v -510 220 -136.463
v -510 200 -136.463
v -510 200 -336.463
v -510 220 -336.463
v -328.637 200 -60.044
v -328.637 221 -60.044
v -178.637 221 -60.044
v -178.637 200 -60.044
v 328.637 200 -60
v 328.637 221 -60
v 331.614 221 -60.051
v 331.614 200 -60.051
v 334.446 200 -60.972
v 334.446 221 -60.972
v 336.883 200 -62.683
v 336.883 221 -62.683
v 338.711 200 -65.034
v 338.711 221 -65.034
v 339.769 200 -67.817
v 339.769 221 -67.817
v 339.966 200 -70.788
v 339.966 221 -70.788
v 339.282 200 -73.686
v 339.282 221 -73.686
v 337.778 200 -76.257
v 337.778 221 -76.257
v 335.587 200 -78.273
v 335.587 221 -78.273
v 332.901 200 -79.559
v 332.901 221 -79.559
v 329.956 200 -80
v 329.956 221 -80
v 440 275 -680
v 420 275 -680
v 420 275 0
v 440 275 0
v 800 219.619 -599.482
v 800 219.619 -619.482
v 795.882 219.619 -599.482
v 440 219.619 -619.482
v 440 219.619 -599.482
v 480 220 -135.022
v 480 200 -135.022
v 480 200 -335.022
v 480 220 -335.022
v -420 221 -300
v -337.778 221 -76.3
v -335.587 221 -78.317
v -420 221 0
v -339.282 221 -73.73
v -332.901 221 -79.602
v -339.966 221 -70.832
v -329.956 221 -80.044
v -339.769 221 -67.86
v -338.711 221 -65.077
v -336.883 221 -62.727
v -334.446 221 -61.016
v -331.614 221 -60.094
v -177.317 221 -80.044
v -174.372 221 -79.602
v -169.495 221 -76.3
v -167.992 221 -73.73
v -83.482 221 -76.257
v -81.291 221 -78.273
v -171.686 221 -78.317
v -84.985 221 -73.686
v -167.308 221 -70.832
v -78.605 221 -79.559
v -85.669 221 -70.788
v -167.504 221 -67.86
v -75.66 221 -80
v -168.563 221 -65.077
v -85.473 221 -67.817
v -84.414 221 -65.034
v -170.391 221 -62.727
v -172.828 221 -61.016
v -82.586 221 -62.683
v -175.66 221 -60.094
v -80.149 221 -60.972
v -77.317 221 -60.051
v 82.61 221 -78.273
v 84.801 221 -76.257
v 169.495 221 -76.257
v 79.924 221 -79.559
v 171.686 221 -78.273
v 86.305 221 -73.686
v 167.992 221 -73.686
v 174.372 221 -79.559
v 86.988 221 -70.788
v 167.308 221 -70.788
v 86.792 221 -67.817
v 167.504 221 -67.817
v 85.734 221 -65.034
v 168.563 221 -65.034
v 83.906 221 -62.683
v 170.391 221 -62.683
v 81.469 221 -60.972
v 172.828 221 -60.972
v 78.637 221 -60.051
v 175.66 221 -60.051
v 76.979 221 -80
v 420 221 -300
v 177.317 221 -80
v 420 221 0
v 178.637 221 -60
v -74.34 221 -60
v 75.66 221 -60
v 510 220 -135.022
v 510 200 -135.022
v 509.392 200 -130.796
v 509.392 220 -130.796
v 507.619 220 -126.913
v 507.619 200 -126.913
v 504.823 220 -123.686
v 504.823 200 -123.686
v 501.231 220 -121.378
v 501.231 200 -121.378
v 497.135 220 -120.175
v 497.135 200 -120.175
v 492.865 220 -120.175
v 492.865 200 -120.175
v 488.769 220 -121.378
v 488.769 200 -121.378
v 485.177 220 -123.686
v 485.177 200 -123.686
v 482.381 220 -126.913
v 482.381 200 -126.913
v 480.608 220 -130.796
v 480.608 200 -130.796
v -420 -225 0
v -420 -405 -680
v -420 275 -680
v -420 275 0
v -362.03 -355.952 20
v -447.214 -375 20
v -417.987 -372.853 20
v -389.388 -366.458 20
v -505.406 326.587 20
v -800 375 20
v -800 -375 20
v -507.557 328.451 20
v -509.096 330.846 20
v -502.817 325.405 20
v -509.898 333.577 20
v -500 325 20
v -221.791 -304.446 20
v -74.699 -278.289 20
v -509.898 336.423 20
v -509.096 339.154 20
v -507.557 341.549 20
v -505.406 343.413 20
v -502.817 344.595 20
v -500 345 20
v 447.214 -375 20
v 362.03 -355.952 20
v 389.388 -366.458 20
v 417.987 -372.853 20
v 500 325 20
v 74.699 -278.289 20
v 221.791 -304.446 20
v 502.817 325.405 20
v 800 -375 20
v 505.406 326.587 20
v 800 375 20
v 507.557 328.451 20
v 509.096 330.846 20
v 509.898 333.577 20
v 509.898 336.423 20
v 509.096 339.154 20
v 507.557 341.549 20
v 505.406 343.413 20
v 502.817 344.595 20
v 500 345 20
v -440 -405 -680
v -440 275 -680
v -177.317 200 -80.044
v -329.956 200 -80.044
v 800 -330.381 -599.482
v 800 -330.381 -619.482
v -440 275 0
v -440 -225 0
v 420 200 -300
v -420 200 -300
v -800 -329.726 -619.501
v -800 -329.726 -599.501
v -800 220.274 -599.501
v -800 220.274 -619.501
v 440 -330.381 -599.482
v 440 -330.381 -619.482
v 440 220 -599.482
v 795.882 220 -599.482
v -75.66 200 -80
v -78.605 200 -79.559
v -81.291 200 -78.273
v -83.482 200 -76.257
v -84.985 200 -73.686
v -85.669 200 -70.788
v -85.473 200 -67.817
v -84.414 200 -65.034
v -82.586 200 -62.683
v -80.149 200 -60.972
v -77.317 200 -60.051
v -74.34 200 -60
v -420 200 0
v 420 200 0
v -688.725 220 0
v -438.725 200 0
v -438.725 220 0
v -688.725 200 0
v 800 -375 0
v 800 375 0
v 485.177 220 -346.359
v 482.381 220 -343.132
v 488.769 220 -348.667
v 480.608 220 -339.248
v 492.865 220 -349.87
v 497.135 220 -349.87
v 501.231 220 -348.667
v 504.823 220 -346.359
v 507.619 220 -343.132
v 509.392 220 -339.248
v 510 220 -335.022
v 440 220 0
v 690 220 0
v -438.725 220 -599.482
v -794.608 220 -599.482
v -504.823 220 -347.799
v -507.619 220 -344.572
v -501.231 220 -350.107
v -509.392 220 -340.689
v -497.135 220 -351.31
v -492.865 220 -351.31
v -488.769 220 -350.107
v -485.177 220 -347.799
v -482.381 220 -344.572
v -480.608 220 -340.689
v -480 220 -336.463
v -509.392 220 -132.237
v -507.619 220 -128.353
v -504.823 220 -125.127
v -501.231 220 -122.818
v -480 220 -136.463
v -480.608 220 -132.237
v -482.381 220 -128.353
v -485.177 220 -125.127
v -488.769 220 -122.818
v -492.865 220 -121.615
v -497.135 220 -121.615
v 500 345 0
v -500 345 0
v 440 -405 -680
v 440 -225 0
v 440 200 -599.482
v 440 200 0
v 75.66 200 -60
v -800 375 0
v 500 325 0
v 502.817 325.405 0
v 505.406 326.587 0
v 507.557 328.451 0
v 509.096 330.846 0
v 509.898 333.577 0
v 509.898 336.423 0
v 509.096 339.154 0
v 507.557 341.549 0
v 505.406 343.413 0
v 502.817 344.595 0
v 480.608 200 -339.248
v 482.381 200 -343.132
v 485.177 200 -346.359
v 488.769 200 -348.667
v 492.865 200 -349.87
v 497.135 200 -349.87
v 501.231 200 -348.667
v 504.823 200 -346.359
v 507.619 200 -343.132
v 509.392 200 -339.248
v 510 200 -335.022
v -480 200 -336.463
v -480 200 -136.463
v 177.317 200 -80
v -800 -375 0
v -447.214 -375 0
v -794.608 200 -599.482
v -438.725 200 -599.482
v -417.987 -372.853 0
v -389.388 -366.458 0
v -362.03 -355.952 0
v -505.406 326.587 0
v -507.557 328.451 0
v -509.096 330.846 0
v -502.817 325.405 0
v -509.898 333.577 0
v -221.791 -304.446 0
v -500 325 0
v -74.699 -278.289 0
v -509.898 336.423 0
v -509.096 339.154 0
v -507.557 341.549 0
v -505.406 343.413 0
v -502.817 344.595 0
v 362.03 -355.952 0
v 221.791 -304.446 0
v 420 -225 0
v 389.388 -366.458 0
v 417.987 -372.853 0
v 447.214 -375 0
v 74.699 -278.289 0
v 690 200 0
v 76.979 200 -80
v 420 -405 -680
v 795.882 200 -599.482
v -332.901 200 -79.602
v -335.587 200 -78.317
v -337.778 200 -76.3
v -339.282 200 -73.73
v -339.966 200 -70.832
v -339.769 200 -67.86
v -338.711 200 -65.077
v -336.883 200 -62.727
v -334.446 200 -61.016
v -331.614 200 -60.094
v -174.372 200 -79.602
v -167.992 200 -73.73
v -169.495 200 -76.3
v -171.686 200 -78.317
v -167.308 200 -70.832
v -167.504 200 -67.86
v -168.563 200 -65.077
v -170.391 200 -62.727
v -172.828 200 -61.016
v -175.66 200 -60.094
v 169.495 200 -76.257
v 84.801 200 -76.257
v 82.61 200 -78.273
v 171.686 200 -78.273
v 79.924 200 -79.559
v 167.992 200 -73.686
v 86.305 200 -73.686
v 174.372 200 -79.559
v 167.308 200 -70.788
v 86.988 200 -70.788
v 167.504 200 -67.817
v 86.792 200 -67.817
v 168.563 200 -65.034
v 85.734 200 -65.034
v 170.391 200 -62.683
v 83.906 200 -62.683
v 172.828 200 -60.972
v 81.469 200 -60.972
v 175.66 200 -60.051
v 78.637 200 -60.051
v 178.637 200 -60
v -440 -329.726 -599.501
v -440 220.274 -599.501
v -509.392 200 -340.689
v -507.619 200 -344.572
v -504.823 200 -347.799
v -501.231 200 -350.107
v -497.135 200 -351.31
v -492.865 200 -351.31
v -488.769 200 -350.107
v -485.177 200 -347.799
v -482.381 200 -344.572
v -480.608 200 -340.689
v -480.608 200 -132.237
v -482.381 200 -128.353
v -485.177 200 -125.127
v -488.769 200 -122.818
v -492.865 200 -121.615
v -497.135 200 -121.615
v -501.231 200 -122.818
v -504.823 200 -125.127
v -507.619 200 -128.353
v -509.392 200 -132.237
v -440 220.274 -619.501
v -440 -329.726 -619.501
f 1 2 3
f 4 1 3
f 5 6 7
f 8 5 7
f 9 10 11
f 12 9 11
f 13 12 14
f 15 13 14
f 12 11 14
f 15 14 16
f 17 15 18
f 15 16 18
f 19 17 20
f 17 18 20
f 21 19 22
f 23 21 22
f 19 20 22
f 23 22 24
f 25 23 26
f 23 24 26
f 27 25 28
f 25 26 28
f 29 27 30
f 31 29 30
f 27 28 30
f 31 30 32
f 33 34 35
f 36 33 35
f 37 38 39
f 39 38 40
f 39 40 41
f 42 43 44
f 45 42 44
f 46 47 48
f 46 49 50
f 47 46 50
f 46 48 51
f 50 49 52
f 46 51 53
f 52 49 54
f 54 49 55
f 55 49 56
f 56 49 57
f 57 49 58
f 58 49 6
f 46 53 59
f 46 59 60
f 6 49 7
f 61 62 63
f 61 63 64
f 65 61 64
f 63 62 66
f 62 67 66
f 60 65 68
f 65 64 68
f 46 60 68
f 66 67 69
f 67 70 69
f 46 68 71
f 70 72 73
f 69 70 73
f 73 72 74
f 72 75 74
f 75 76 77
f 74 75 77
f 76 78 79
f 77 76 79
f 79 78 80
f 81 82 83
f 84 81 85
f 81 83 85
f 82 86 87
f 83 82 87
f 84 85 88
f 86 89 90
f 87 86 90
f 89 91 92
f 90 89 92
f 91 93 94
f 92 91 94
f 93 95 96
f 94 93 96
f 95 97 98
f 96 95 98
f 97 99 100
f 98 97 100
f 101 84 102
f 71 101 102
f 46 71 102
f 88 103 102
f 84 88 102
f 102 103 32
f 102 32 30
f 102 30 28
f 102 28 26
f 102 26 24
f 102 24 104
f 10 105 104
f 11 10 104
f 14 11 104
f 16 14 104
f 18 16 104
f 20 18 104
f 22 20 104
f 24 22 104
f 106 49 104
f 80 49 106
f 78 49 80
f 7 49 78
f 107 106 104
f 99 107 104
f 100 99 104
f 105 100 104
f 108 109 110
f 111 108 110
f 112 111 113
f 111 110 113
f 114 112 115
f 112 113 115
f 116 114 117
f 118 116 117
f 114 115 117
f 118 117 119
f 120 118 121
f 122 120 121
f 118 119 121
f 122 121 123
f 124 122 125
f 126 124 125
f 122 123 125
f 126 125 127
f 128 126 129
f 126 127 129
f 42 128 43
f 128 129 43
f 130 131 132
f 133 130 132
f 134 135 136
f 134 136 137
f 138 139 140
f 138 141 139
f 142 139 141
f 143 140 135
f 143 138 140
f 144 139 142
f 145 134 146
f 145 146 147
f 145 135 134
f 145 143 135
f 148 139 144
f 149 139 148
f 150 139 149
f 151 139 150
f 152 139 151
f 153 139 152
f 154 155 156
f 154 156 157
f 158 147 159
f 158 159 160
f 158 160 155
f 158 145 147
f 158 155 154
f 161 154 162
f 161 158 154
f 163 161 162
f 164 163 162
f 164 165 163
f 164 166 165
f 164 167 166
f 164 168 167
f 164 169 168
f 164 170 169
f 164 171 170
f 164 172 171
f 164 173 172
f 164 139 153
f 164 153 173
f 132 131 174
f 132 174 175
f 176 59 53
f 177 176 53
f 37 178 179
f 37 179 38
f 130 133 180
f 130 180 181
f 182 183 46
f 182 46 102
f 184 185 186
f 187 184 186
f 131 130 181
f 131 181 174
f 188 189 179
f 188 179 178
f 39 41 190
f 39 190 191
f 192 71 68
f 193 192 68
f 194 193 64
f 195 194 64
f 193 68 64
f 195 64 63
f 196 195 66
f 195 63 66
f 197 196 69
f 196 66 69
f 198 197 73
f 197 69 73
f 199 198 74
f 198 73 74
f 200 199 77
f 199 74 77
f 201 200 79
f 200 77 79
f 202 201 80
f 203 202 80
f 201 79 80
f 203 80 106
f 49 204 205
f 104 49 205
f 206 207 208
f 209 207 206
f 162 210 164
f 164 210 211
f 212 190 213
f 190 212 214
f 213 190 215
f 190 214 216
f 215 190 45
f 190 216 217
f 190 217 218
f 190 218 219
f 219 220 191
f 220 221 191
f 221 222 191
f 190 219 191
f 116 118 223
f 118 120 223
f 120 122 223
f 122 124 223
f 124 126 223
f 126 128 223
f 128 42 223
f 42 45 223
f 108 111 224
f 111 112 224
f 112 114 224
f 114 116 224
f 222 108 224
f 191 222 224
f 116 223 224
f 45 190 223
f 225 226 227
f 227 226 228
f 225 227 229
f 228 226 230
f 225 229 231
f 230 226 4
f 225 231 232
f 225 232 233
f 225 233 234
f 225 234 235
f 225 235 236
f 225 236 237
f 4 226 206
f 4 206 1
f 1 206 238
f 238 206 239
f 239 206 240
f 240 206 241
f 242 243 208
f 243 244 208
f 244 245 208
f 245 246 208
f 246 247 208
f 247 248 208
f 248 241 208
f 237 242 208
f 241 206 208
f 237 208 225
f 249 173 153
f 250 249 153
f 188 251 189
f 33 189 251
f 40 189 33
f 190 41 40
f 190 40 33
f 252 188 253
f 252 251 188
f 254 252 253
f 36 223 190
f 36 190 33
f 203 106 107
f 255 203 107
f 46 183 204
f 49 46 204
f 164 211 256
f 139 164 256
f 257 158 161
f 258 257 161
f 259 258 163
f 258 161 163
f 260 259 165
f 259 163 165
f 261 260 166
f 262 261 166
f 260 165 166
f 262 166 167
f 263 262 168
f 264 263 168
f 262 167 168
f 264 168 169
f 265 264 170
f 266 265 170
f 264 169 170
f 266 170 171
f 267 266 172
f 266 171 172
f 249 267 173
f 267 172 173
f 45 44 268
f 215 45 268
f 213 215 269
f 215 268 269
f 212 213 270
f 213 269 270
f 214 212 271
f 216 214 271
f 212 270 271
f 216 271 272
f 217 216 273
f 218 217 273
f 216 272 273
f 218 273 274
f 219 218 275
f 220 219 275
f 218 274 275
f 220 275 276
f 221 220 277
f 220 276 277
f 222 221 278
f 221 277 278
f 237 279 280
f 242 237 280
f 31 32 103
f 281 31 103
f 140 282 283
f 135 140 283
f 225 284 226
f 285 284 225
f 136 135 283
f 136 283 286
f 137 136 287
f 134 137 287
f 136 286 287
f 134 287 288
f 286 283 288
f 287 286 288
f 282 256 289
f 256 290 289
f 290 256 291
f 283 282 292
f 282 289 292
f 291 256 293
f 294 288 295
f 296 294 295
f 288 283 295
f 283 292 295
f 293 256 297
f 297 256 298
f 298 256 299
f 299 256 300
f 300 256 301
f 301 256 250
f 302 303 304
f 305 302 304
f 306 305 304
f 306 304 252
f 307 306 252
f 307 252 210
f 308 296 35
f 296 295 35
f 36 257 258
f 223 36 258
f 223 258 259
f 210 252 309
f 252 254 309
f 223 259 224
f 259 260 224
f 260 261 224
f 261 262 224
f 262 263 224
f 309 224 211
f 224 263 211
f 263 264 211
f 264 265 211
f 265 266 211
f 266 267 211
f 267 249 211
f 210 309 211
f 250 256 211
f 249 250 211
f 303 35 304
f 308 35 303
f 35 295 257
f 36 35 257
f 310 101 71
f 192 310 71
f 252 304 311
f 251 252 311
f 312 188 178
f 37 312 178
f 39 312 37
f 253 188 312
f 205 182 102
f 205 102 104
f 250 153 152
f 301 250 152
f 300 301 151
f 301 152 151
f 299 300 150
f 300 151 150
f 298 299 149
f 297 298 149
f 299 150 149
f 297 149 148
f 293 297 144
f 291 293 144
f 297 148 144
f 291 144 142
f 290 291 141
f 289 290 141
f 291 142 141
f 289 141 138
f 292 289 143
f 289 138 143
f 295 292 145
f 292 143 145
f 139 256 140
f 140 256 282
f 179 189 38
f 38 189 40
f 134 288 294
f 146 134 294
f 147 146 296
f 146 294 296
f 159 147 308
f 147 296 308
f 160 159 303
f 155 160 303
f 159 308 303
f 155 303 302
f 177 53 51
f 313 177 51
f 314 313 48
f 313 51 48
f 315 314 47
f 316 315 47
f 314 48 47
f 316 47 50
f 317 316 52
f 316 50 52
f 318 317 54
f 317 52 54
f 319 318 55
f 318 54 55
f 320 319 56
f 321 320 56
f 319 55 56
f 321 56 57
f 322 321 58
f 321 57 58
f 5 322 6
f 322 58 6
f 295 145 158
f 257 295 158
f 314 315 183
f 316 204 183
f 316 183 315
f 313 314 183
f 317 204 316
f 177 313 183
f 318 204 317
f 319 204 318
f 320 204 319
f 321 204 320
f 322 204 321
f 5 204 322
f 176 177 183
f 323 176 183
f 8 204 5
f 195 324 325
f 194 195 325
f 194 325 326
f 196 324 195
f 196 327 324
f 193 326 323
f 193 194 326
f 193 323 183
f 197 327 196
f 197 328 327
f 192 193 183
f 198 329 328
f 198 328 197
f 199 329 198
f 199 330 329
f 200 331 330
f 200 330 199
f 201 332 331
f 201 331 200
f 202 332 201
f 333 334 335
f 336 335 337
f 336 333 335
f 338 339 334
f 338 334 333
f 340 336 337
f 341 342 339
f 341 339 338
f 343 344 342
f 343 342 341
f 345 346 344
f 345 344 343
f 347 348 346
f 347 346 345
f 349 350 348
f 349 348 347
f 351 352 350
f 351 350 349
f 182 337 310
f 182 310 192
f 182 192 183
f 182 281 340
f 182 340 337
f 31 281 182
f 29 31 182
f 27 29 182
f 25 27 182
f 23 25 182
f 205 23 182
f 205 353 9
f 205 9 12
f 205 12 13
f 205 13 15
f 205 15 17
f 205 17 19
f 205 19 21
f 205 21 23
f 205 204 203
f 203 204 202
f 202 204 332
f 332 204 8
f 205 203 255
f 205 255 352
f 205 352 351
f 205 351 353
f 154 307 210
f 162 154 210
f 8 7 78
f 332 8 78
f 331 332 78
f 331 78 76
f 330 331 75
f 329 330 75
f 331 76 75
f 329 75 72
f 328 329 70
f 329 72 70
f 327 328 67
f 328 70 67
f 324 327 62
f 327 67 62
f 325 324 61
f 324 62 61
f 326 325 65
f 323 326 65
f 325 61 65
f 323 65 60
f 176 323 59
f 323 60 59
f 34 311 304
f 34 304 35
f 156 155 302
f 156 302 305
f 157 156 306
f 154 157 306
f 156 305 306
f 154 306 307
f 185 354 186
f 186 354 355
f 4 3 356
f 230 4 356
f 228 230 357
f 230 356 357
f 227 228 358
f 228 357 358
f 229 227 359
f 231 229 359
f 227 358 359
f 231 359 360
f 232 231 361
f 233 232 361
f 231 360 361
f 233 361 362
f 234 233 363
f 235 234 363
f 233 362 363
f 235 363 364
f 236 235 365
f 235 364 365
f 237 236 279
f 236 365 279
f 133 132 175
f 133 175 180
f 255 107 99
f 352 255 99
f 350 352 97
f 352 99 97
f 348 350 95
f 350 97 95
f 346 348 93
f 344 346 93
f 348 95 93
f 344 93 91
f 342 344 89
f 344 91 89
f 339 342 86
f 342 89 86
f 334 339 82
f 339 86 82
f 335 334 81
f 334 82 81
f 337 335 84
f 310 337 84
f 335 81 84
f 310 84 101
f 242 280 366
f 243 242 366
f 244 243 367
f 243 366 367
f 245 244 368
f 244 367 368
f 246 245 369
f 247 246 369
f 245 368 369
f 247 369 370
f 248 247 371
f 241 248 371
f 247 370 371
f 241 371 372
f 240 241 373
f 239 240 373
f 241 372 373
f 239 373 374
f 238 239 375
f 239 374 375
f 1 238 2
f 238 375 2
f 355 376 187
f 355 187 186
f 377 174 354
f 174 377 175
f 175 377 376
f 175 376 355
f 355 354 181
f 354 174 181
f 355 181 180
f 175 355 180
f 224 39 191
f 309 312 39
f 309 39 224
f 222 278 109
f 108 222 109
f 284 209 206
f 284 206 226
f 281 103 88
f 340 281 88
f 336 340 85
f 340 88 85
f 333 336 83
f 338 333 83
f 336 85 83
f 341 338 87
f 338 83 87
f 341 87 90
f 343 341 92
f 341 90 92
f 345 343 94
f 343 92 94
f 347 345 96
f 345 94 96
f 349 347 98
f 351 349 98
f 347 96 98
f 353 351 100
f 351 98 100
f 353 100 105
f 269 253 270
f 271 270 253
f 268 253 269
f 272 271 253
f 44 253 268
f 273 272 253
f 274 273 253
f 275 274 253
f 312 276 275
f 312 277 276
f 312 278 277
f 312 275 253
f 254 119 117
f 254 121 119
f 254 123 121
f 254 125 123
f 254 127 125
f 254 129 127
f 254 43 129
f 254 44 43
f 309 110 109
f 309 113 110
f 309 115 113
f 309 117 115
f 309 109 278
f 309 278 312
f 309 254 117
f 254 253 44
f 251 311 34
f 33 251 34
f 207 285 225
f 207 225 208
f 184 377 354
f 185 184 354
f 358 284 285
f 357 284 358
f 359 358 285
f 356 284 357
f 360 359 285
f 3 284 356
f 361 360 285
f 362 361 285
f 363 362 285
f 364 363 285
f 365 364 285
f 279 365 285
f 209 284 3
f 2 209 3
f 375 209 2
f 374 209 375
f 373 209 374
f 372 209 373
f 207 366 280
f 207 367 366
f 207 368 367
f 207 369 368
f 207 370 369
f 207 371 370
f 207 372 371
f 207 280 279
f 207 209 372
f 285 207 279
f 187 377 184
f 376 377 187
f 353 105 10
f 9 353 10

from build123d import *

# Parameters (mm, degrees)
F1_DEPTH  = 20
F3_START  = -420
F3_DEPTH  = 20
F5_START  = 420
F5_DEPTH  = 20
F7_START  = -200
F6_W      = 840
F6_H      = 300
F7_DEPTH  = 21
F9_START  = -200
F9_DEPTH  = 20
F11_START = -440
F10_W     = 550
F10_H     = 20
F11_DEPTH = 360
F13_DEPTH = 61
F15_DEPTH = 20
F17_DEPTH = 20
F19_START = 440
F18_W     = 550
F18_H     = 20
F19_DEPTH = 360
F21_DEPTH = 20
F23_DEPTH = 21
F24_DEPTH = 21


with BuildPart() as f1:
    # F0 (on Top) → F1 (new body)
    with BuildSketch(Plane.XY):
        with BuildLine():
            Line((447.2135955, -375), (800, -375))
            Line((800, -375), (800, 375))
            Line((800, 375), (-800, 375))
            Line((-800, 375), (-800, -375))
            Line((-800, -375), (-447.2135955, -375))
            ThreePointArc((-447.2135955, -375), (-403.5700174528, -370.1800145897), (-362.0300535, -355.9523809524))
            ThreePointArc((-362.0300535, -355.9523809524), (0, -275), (362.0300535, -355.9523809524))
            ThreePointArc((362.0300535, -355.9523809524), (403.5700174528, -370.1800145897), (447.2135955, -375))
        make_face()
    extrude(amount=F1_DEPTH)

    # F4 (on Right) → F5 (join)
    with BuildSketch(Plane.YZ.offset(F5_START)):
        Polygon((275, 0), (-225, 0), (-405, -680), (275, -680), align=None)
    extrude(amount=F5_DEPTH)

    # F14 (on face) → F15 (cut, through all)
    with BuildSketch(Plane.XY.offset(20)):
        with BuildLine():
            Line((500, 345), (-500, 345))
            ThreePointArc((-500, 345), (-510, 335), (-500, 325))
            Line((-500, 325), (500, 325))
            ThreePointArc((500, 325), (510, 335), (500, 345))
        make_face()
    extrude(amount=-F15_DEPTH, mode=Mode.SUBTRACT)

    # F16 (on face) → F17 (join)
    with BuildSketch(Plane.XZ.offset(-200)):
        Polygon((690, 0), (440, 0), (440, -599.4818952843), (795.8823083662, -599.4818952843), align=None)
    extrude(amount=-F17_DEPTH)

    # F18 (on Right) → F19 (join)
    with BuildSketch(Plane.YZ.offset(F19_START)):
        with Locations((-55.3809798328, -609.4818952843)):
            Rectangle(F18_W, F18_H)
    extrude(amount=F19_DEPTH)

    # F20 (on face) → F21 (cut, through all)
    with BuildSketch(Plane.XZ.offset(-200)):
        with BuildLine():
            ThreePointArc((510, -135.0222993022), (495, -120.0222993022), (480, -135.0222993022))
            Line((480, -135.0222993022), (480, -335.0222993022))
            ThreePointArc((480, -335.0222993022), (495, -350.0222993022), (510, -335.0222993022))
            Line((510, -335.0222993022), (510, -135.0222993022))
        make_face()
    extrude(amount=-F21_DEPTH, mode=Mode.SUBTRACT)


with BuildPart() as f3:
    # F2 (on Right) → F3 (new body)
    with BuildSketch(Plane.YZ.offset(F3_START)):
        Polygon((275, -680), (275, 0), (-225, 0), (-405, -680), align=None)
    extrude(amount=-F3_DEPTH)

    # F10 (on Right) → F11 (join)
    with BuildSketch(Plane.YZ.offset(F11_START)):
        with Locations((-54.7264778555, -609.5014810562)):
            Rectangle(F10_W, F10_H)
    extrude(amount=-F11_DEPTH)


with BuildPart() as f7:
    # F6 (on Front) → F7 (new body)
    with BuildSketch(Plane.XZ.offset(F7_START)):
        with Locations((0, -150)):
            Rectangle(F6_W, F6_H)
    extrude(amount=-F7_DEPTH)

    # F22 (on face) → F23 (cut, through all)
    with BuildSketch(Plane(origin=(0, 221, 0), x_dir=(-1, 0, 0), z_dir=(0, 1, 0))):
        with BuildLine():
            Line((-178.6368364096, -60), (-328.6368364096, -60))
            ThreePointArc((-328.6368364096, -60), (-339.9782086297, -69.2952157691), (-329.9564645399, -80))
            Line((-329.9564645399, -80), (-177.3172082792, -80))
            ThreePointArc((-177.3172082792, -80), (-167.2954641894, -69.2952157691), (-178.6368364096, -60))
        make_face()
    extrude(amount=-F23_DEPTH, mode=Mode.SUBTRACT)

    # F22 (on face) → F24 (cut, through all)
    with BuildSketch(Plane(origin=(0, 221, 0), x_dir=(-1, 0, 0), z_dir=(0, 1, 0))):
        with BuildLine():
            Line((75.6598140652, -79.9999982119), (-75.6598140652, -59.9999982119))
            ThreePointArc((-75.6598140652, -59.9999982119), (-87.0011862853, -69.295213981), (-76.9794421956, -79.9999982119))
            Line((-76.9794421956, -79.9999982119), (75.6598140652, -79.9999982119))
        make_face()
        with BuildLine():
            Line((74.3401859348, -59.9999982119), (-75.6598140652, -59.9999982119))
            Line((-75.6598140652, -59.9999982119), (75.6598140652, -79.9999982119))
            ThreePointArc((75.6598140652, -79.9999982119), (85.6815581549, -69.295213981), (74.3401859348, -59.9999982119))
        make_face()
        with BuildLine():
            Line((328.6368364096, -60.0435336719), (178.6368364096, -60.0435336719))
            ThreePointArc((178.6368364096, -60.0435336719), (167.2954641894, -69.3387494411), (177.3172082792, -80.0435336719))
            Line((177.3172082792, -80.0435336719), (329.9564645399, -80.0435336719))
            ThreePointArc((329.9564645399, -80.0435336719), (339.9782086297, -69.338749441), (328.6368364096, -60.0435336719))
        make_face()
    extrude(amount=-F24_DEPTH, mode=Mode.SUBTRACT)


with BuildPart() as f9:
    # F8 (on Front) → F9 (new body)
    with BuildSketch(Plane.XZ.offset(F9_START)):
        Polygon((-438.7253674408, -599.4818952843), (-438.7253674408, 0), (-688.7253674408, 0), (-794.607675807, -599.4818952843), align=None)
    extrude(amount=-F9_DEPTH)

    # F12 (on face) → F13 (cut)
    with BuildSketch(Plane.XZ.offset(-200)):
        with BuildLine():
            ThreePointArc((-480, -136.4627885793), (-495, -121.4627885793), (-510, -136.4627885793))
            Line((-510, -136.4627885793), (-510, -336.4627885793))
            ThreePointArc((-510, -336.4627885793), (-495, -351.4627885793), (-480, -336.4627885793))
            Line((-480, -336.4627885793), (-480, -136.4627885793))
        make_face()
    extrude(amount=-F13_DEPTH, mode=Mode.SUBTRACT)


solid = Compound([f1.part, f3.part, f7.part, f9.part])
